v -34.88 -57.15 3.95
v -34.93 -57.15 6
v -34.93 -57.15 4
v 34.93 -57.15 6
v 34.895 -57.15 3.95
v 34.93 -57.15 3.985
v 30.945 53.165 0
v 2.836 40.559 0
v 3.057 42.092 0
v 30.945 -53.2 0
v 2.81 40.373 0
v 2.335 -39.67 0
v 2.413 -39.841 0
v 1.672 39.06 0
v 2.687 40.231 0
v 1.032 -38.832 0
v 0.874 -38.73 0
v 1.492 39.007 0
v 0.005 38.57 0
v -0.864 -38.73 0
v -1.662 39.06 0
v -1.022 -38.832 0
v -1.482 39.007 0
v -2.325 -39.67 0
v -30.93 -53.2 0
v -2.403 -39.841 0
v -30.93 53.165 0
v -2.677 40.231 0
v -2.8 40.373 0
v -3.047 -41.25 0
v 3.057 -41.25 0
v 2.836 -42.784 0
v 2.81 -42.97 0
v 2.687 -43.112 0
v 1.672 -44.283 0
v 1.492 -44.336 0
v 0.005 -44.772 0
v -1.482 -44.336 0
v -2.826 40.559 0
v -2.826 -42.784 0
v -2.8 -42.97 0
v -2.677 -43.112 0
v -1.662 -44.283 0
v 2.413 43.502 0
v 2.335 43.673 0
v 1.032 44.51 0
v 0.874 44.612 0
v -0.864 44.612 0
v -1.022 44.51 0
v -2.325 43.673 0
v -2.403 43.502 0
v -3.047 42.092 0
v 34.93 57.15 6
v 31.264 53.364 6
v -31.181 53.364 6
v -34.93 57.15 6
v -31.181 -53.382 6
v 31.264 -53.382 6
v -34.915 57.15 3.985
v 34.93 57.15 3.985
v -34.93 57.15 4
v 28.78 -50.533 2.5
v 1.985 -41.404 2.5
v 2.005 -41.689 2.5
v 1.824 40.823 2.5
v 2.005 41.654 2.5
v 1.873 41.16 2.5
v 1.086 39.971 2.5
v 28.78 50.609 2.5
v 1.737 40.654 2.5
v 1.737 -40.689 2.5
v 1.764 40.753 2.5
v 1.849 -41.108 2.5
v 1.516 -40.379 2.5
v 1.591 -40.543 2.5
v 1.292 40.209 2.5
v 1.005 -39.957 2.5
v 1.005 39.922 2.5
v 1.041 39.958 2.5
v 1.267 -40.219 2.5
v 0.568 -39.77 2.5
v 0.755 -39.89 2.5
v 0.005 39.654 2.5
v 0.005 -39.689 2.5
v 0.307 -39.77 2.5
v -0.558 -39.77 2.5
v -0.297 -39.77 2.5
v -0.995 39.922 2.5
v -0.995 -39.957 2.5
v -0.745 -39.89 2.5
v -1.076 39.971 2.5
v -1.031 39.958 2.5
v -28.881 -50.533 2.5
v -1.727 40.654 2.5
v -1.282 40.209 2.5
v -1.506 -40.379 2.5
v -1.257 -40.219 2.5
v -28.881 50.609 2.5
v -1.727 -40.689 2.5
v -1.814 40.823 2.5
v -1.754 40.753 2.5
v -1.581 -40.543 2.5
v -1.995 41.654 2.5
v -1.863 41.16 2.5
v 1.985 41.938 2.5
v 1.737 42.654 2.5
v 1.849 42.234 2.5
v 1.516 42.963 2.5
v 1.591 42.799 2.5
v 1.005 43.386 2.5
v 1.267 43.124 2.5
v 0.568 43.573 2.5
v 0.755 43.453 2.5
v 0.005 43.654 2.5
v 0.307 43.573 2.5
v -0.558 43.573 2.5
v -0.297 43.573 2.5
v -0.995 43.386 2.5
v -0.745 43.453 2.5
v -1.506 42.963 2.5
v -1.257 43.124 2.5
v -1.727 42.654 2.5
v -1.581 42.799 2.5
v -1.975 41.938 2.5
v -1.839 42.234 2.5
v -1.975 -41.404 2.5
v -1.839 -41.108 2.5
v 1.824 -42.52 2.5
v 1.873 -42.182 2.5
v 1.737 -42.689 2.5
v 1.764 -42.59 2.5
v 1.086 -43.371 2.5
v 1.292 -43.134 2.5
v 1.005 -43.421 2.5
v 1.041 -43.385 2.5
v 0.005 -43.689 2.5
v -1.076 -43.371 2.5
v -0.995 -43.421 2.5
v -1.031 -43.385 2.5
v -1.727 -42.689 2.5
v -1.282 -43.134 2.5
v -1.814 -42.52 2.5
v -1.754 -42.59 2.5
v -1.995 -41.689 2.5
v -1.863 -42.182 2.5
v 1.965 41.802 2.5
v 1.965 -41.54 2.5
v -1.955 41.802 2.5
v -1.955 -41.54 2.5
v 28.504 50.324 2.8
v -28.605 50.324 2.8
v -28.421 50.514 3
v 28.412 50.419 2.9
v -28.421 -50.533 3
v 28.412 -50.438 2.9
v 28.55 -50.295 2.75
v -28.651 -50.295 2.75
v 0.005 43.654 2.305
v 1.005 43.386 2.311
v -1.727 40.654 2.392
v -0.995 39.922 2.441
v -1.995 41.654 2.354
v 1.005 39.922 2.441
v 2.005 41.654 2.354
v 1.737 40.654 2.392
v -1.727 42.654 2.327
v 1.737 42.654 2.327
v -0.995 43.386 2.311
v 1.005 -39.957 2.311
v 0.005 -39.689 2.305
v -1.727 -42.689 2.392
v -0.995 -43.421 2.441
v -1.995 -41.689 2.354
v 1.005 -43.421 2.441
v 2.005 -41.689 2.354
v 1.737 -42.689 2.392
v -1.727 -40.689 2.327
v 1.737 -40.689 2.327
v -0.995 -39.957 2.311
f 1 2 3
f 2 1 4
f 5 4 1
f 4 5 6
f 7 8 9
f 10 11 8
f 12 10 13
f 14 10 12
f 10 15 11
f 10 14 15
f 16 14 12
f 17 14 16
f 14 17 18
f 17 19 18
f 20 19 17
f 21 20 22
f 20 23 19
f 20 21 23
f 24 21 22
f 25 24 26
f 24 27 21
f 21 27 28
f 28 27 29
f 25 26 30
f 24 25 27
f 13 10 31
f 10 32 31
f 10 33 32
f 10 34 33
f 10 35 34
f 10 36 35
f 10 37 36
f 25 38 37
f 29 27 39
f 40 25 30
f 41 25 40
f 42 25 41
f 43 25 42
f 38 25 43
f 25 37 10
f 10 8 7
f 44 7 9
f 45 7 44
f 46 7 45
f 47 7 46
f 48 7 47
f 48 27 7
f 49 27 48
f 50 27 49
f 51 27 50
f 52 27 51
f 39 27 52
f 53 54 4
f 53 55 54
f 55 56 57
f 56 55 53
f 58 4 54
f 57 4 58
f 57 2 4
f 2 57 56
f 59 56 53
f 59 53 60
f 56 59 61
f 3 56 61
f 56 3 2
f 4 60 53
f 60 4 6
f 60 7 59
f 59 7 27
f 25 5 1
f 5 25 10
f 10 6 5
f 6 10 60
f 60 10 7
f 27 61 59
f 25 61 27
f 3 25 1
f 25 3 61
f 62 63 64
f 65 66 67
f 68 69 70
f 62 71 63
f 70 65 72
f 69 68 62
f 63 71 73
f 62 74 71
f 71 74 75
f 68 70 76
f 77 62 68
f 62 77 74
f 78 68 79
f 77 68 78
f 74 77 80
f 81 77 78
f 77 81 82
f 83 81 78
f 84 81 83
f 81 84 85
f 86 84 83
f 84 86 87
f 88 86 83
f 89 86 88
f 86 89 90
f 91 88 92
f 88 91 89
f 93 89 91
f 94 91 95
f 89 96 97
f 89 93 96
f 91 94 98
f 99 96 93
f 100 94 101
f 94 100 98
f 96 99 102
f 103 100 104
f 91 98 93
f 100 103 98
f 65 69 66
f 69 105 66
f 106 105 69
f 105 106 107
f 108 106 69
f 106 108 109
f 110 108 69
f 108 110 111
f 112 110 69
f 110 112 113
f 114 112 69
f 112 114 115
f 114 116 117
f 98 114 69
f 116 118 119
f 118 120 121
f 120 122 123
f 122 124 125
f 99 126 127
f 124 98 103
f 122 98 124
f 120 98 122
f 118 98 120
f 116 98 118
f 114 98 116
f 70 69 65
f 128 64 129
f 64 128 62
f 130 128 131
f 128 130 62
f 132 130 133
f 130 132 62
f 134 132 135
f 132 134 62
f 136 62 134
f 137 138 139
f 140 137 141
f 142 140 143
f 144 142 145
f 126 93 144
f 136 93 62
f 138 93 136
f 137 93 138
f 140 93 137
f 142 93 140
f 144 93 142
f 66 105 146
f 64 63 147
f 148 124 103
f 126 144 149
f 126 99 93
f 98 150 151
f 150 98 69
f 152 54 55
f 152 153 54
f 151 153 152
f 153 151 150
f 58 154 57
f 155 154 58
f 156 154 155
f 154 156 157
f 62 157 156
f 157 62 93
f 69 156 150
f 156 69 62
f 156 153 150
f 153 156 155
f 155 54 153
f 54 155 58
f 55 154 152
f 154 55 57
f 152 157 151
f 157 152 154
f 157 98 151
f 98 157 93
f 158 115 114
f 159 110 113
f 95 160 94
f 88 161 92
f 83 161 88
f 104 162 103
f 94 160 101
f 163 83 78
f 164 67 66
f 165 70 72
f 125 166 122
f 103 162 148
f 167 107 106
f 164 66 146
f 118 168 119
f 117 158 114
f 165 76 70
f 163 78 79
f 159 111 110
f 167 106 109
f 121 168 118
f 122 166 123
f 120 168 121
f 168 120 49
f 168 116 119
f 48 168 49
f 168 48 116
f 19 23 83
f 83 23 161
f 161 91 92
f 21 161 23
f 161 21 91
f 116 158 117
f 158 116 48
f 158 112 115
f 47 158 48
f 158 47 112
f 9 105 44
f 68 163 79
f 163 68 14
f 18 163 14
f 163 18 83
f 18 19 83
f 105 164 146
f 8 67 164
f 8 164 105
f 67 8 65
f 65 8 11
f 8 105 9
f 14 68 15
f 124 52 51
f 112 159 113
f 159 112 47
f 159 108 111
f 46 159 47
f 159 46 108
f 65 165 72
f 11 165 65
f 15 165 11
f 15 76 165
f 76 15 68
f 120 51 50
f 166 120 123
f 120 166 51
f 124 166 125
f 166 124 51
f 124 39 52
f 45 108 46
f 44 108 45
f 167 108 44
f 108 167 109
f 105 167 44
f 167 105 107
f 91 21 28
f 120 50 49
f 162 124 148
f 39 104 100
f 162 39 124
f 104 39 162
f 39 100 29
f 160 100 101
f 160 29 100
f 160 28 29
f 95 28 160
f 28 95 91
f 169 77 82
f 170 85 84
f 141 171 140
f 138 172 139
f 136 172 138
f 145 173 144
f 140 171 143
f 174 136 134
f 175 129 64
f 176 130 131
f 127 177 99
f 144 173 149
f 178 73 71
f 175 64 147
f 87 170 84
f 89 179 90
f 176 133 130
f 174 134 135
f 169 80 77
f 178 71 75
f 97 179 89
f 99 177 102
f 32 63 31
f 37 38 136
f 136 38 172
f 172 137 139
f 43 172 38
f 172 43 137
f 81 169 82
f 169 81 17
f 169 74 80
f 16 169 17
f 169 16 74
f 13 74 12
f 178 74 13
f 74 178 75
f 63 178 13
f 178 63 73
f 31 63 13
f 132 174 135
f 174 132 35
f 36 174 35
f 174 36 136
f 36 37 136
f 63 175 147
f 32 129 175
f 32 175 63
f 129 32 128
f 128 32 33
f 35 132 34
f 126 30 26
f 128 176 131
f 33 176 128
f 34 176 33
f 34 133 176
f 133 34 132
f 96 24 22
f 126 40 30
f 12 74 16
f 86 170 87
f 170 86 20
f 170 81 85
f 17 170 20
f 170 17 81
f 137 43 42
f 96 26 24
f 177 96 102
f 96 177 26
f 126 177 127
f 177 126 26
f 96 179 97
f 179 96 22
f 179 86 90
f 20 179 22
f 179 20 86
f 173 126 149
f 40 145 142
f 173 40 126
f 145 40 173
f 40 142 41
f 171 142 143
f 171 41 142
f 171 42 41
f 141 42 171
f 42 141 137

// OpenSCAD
// WALLY - Wall Plate Customizer v1.1
// by TheNewHobbyist 2013 (http://thenewhobbyist.com)
// http://www.thingiverse.com/thing:
//
// Most of the connectors used with this thing are panel mount connectors from
// www.DataPro.net I can't vouch for their quality but they did have easy to
// find dimensions for their products so I used them.
//
// This could be tightened up considerably but I thought I'd get it out there for people
// to experiment with before I lose my mind staring at it too long. Also this is my
// first OpenSCAD model so cut me some slack ;)
//
//   Notes:
//
// * The plug types "Duplex Outlet", "Toggle Switch", and "Rocker" will all use the
//   entire plate when selected in top or bottom configuration. The other selection (if
//   not "none" will be selected.
//
// * "None" and "Blank should not be considered equal. if "None" is selected for one of
//   the two holes on a plate the other selection will be centered on that plate. If
//   "Blank" is selected that plug location will remain blank but the other selection
//   will NOT move into a centered position.
//
//	Change Log:
//
//	v1.1
//	UPDATED: Screw hole locations for designer and toggle plate types.
//	UPDATED: Hole size for designer plate type.
//	UPDATED: Outlet hole spacing
//

  //////////////////////////
 // Customizer Settings: //
//////////////////////////

//How big are we talkin' here?
plate_width = 1; //	[1:5]

//Pick a plug or full plate type
1st_plate = "none";  //	["none":None, "blank":Blank Port, "toggle":Full Plate - Toggle Switch, "outlet":Full Plate - Duplex Outlet, "rocker":Full Plate - Rocker/Designer Plate, "keystone1":Keystone Jack, "vga":VGA Port, "hdmi":HDMI Port, "dvi":DVI-I Port, "displayport":Displayport, "cat5e":Cat5e/Cat6 Port, "usb-a":USB-A Port, "usb-b":USB-B Port, "firewire":Firewire IEEE 1394 Port, "db09":DB-09 Port, "ps2":PS2 Port, "f-type": F-Type/Coaxial Port,"svideo":S-Video Port, "stereo":Stereo Headphone Jack]
//Pick a bottom plug type or leave as none
1st_plate_bottom_hole = "none";  //	["none":None, "blank":Blank Port, "keystone1":Keystone Jack, "vga":VGA Port, "hdmi":HDMI Port, "dvi":DVI-I Port, "displayport":Displayport, "cat5e":Cat5e/Cat6 Port, "usb-a":USB-A Port, "usb-b":USB-B Port, "firewire":Firewire IEEE 1394 Port, "db09":DB-09 Port, "ps2":PS2 Port, "f-type": F-Type/Coaxial Port,"svideo":S-Video Port, "stereo":Stereo Headphone Jack]
//Pick a plug or full plate type
2nd_plate = "none";  //	["none":None, "blank":Blank Port, "toggle":Full Plate - Toggle Switch, "outlet":Full Plate - Duplex Outlet, "rocker":Full Plate - Rocker/Designer Plate, "keystone1":Keystone Jack, "vga":VGA Port, "hdmi":HDMI Port, "dvi":DVI-I Port, "displayport":Displayport, "cat5e":Cat5e/Cat6 Port, "usb-a":USB-A Port, "usb-b":USB-B Port, "firewire":Firewire IEEE 1394 Port, "db09":DB-09 Port, "ps2":PS2 Port, "f-type": F-Type/Coaxial Port,"svideo":S-Video Port, "stereo":Stereo Headphone Jack]
//Pick a bottom plug type or leave as none
2nd_plate_bottom_hole = "none";  //	["none":None, "blank":Blank Port, "keystone1":Keystone Jack, "vga":VGA Port, "hdmi":HDMI Port, "dvi":DVI-I Port, "displayport":Displayport, "cat5e":Cat5e/Cat6 Port, "usb-a":USB-A Port, "usb-b":USB-B Port, "firewire":Firewire IEEE 1394 Port, "db09":DB-09 Port, "ps2":PS2 Port, "f-type": F-Type/Coaxial Port,"svideo":S-Video Port, "stereo":Stereo Headphone Jack]
//Pick a plug or full plate type
3rd_plate = "none";  //	["none":None, "blank":Blank Port, "toggle":Full Plate - Toggle Switch, "outlet":Full Plate - Duplex Outlet, "rocker":Full Plate - Rocker/Designer Plate, "keystone1":Keystone Jack, "vga":VGA Port, "hdmi":HDMI Port, "dvi":DVI-I Port, "displayport":Displayport, "cat5e":Cat5e/Cat6 Port, "usb-a":USB-A Port, "usb-b":USB-B Port, "firewire":Firewire IEEE 1394 Port, "db09":DB-09 Port, "ps2":PS2 Port, "f-type": F-Type/Coaxial Port,"svideo":S-Video Port, "stereo":Stereo Headphone Jack]
//Pick a bottom plug type or leave as none
3rd_plate_bottom_hole = "none";  //	["none":None, "blank":Blank Port, "keystone1":Keystone Jack, "vga":VGA Port, "hdmi":HDMI Port, "dvi":DVI-I Port, "displayport":Displayport, "cat5e":Cat5e/Cat6 Port, "usb-a":USB-A Port, "usb-b":USB-B Port, "firewire":Firewire IEEE 1394 Port, "db09":DB-09 Port, "ps2":PS2 Port, "f-type": F-Type/Coaxial Port,"svideo":S-Video Port, "stereo":Stereo Headphone Jack]
//Pick a plug or full plate type
4th_plate = "none";  //	["none":None, "blank":Blank Port, "toggle":Full Plate - Toggle Switch, "outlet":Full Plate - Duplex Outlet, "rocker":Full Plate - Rocker/Designer Plate, "keystone1":Keystone Jack, "vga":VGA Port, "hdmi":HDMI Port, "dvi":DVI-I Port, "displayport":Displayport, "cat5e":Cat5e/Cat6 Port, "usb-a":USB-A Port, "usb-b":USB-B Port, "firewire":Firewire IEEE 1394 Port, "db09":DB-09 Port, "ps2":PS2 Port, "f-type": F-Type/Coaxial Port,"svideo":S-Video Port, "stereo":Stereo Headphone Jack]
//Pick a bottom plug type or leave as none
4th_plate_bottom_hole = "none";  //	["none":None, "blank":Blank Port, "keystone1":Keystone Jack, "vga":VGA Port, "hdmi":HDMI Port, "dvi":DVI-I Port, "displayport":Displayport, "cat5e":Cat5e/Cat6 Port, "usb-a":USB-A Port, "usb-b":USB-B Port, "firewire":Firewire IEEE 1394 Port, "db09":DB-09 Port, "ps2":PS2 Port, "f-type": F-Type/Coaxial Port,"svideo":S-Video Port, "stereo":Stereo Headphone Jack]
//Pick a plug or full plate type
5th_plate = "none";  //	["none":None, "blank":Blank Port, "toggle":Full Plate - Toggle Switch, "outlet":Full Plate - Duplex Outlet, "rocker":Full Plate - Rocker/Designer Plate, "keystone1":Keystone Jack, "vga":VGA Port, "hdmi":HDMI Port, "dvi":DVI-I Port, "displayport":Displayport, "cat5e":Cat5e/Cat6 Port, "usb-a":USB-A Port, "usb-b":USB-B Port, "firewire":Firewire IEEE 1394 Port, "db09":DB-09 Port, "ps2":PS2 Port, "f-type": F-Type/Coaxial Port,"svideo":S-Video Port, "stereo":Stereo Headphone Jack]
//Pick a bottom plug type or leave as none
5th_plate_bottom_hole = "none";  //	["none":None, "blank":Blank Port, "keystone1":Keystone Jack, "vga":VGA Port, "hdmi":HDMI Port, "dvi":DVI-I Port, "displayport":Displayport, "cat5e":Cat5e/Cat6 Port, "usb-a":USB-A Port, "usb-b":USB-B Port, "firewire":Firewire IEEE 1394 Port, "db09":DB-09 Port, "ps2":PS2 Port, "f-type": F-Type/Coaxial Port,"svideo":S-Video Port, "stereo":Stereo Headphone Jack]

  //////////////////////
 // Static Settings: //
//////////////////////

module GoAwayCustomizer() {
// This module is here to stop Customizer from picking up the variables below
}

height = 114.3; //plate height (static)
gang_width=[0,69.86,115.824,161.925,206.375,254]; // Plate widths (standard)

edgewidth = gang_width[plate_width] + 10; // Bevel setting for top and bottom
rightbevel = gang_width[plate_width] - 4; // Bevel for right side (scales)

left_offset = 34.925; // Offset first hole position
switch_offset = 46.0375; // Offset all additional holes
thinner_offset=[0,0.92,0.95,0.96,0.97,0.973]; // Manual fix for right side wackiness

positions=[height/2,42.9,71.4];
positiona = 42.9; // dual plate upper
positionb = 71.4; // dual plate lower

// preview[view:north, tilt:bottom]

  ///////////////////
 // Hole Control: //
///////////////////

module plate1(){
	if (1st_plate == "toggle" || 1st_plate_bottom_hole == "toggle"){
		translate([0,left_offset,0]) toggle_screws();
		translate([0,left_offset,0]) hole("toggle");
		}
	else if (1st_plate == "rocker" || 1st_plate_bottom_hole == "rocker"){
		translate([0,left_offset,0]) rocker_screws();
		translate([0,left_offset,0]) hole("rocker");
		}
	else if (1st_plate == "outlet" || 1st_plate_bottom_hole == "outlet") {
	translate([0,left_offset,0]) hole("outlet");
	}
	else if (1st_plate_bottom_hole == "none") {
		translate([0,left_offset,0]) box_screws();
		translate([positions[0],left_offset,0]) hole(1st_plate);
			}
	else if (1st_plate == "none") {
		translate([0,left_offset,0]) box_screws();
		translate([positions[0],left_offset,0]) hole(1st_plate_bottom_hole);
			}
	else {
	translate([0,left_offset,0]) box_screws();
	translate([positions[1],left_offset,0]) hole(1st_plate);
	translate([positions[2],left_offset,0]) hole(1st_plate_bottom_hole);
	}
}

module plate2(){
	if (2nd_plate == "toggle" || 2nd_plate_bottom_hole == "toggle"){
		translate([0,left_offset + switch_offset,0]) toggle_screws();
		translate([0,left_offset + switch_offset,0]) hole("toggle");
		}
	else if (2nd_plate == "rocker" || 2nd_plate_bottom_hole == "rocker"){
		translate([0,left_offset + switch_offset,0]) rocker_screws();
		translate([0,left_offset + switch_offset,0]) hole("rocker");
		}
	else if (2nd_plate == "outlet" || 2nd_plate_bottom_hole == "outlet") {
	translate([0,left_offset + switch_offset,0]) hole("outlet");
	}
	else if (2nd_plate_bottom_hole == "none") {
		translate([0,left_offset + switch_offset,0]) box_screws();
		translate([positions[0],left_offset + switch_offset,0]) hole(2nd_plate);
			}
	else if (2nd_plate == "none") {
		translate([0,left_offset + switch_offset,0]) box_screws();
		translate([positions[0],left_offset + switch_offset,0]) hole(2nd_plate_bottom_hole);
			}
	else {
	translate([0,left_offset + switch_offset,0]) box_screws();
	translate([positions[1],left_offset + switch_offset,0]) hole(2nd_plate);
	translate([positions[2],left_offset + switch_offset,0]) hole(2nd_plate_bottom_hole);
	}
}

module plate3(){
	if (3rd_plate == "toggle" || 3rd_plate_bottom_hole == "toggle"){
		translate([0,left_offset + switch_offset * 2,0]) toggle_screws();
		translate([0,left_offset + switch_offset * 2,0]) hole("toggle");
		}
	else if (3rd_plate == "rocker" || 3rd_plate_bottom_hole == "rocker"){
		translate([0,left_offset + switch_offset * 2,0]) rocker_screws();
		translate([0,left_offset + switch_offset * 2,0]) hole("rocker");
		}
	else if (3rd_plate == "outlet" || 3rd_plate_bottom_hole == "outlet") {
	translate([0,left_offset + switch_offset * 2,0]) hole("outlet");
	}
	else if (3rd_plate_bottom_hole == "none") {
		translate([0,left_offset + switch_offset * 2,0]) box_screws();
		translate([positions[0],left_offset + switch_offset * 2,0]) hole(3rd_plate);
			}
	else if (3rd_plate == "none") {
		translate([0,left_offset + switch_offset * 2,0]) box_screws();
		translate([positions[0],left_offset + switch_offset * 2,0]) hole(3rd_plate_bottom_hole);
			}
	else {
	translate([0,left_offset + switch_offset * 2,0]) box_screws();
	translate([positions[1],left_offset + switch_offset * 2,0]) hole(3rd_plate);
	translate([positions[2],left_offset + switch_offset * 2,0]) hole(3rd_plate_bottom_hole);
	}
}

module plate4(){
	if (4th_plate == "toggle" || 4th_plate_bottom_hole == "toggle"){
		translate([0,left_offset + switch_offset * 3,0]) toggle_screws();
		translate([0,left_offset + switch_offset * 3,0]) hole("toggle");
		}
	else if (4th_plate == "rocker" || 4th_plate_bottom_hole == "rocker"){
		translate([0,left_offset + switch_offset * 3,0]) rocker_screws();
		translate([0,left_offset + switch_offset * 3,0]) hole("rocker");
		}
	else if (4th_plate == "outlet" || 4th_plate_bottom_hole == "outlet") {
	translate([0,left_offset + switch_offset * 3,0]) hole("outlet");
	}
	else if (4th_plate_bottom_hole == "none") {
		translate([0,left_offset + switch_offset * 3,0]) box_screws();
		translate([positions[0],left_offset + switch_offset * 3,0]) hole(4th_plate);
			}
	else if (4th_plate == "none") {
		translate([0,left_offset + switch_offset * 3,0]) box_screws();
		translate([positions[0],left_offset + switch_offset * 3,0]) hole(4th_plate_bottom_hole);
			}
	else {
	translate([0,left_offset + switch_offset * 3,0]) box_screws();
	translate([positions[1],left_offset + switch_offset * 3,0]) hole(4th_plate);
	translate([positions[2],left_offset + switch_offset * 3,0]) hole(4th_plate_bottom_hole);
	}
}

module plate5(){
	if (5th_plate == "toggle" || 5th_plate_bottom_hole == "toggle"){
		translate([0,left_offset + switch_offset * 4,0]) toggle_screws();
		translate([0,left_offset + switch_offset * 4,0]) hole("toggle");
		}
	else if (5th_plate == "rocker" || 5th_plate_bottom_hole == "rocker"){
		translate([0,left_offset + switch_offset * 4,0]) rocker_screws();
		translate([0,left_offset + switch_offset * 4,0]) hole("rocker");
		}
	else if (5th_plate == "outlet" || 5th_plate_bottom_hole == "outlet") {
	translate([0,left_offset + switch_offset * 4,0]) hole("outlet");
	}
	else if (5th_plate_bottom_hole == "none") {
		translate([0,left_offset + switch_offset * 4,0]) box_screws();
		translate([positions[0],left_offset + switch_offset * 4,0]) hole(5th_plate);
			}
	else if (5th_plate == "none") {
		translate([0,left_offset + switch_offset * 4,0]) box_screws();
		translate([positions[0],left_offset + switch_offset * 4,0]) hole(5th_plate_bottom_hole);
			}
	else {
	translate([0,left_offset + switch_offset * 4,0]) box_screws();
	translate([positions[1],left_offset + switch_offset * 4,0]) hole(5th_plate);
	translate([positions[2],left_offset + switch_offset * 4,0]) hole(5th_plate_bottom_hole);
	}
}

  /////////////////
 // SolidWorks: //
/////////////////

module plate1_solid(){
if (1st_plate == "keystone1" && 1st_plate_bottom_hole == "none") {
	translate([71.4,23.4,-3.9]) hole("keystone_solid");
	}
else if (1st_plate == "keystone1" && 1st_plate_bottom_hole != "outlet" && 1st_plate_bottom_hole != "toggle" && 1st_plate_bottom_hole != "rocker") {
	translate([57.2,23.4,-3.9]) hole("keystone_solid");
	}
if (1st_plate_bottom_hole == "keystone1" && 1st_plate == "none") {
	translate([71.4,23.4,-3.9]) hole("keystone_solid");
	}
else if (1st_plate_bottom_hole == "keystone1" && 1st_plate != "outlet" && 1st_plate != "toggle" && 1st_plate != "rocker") {
	translate([85.6,23.4,-3.9]) hole("keystone_solid");
	}

}

module plate2_solid(){
if (2nd_plate == "keystone1" && 2nd_plate_bottom_hole == "none") {
	translate([71.4,23.4 + switch_offset,-3.9]) hole("keystone_solid");
	}
else if (2nd_plate == "keystone1" && 2nd_plate_bottom_hole != "outlet" && 2nd_plate_bottom_hole != "toggle" && 2nd_plate_bottom_hole != "rocker") {
	translate([57.2,23.4 + switch_offset,-3.9]) hole("keystone_solid");
	}
if (2nd_plate_bottom_hole == "keystone1" && 2nd_plate == "none") {
	translate([71.4,23.4 + switch_offset,-3.9]) hole("keystone_solid");
	}
else if (2nd_plate_bottom_hole == "keystone1" && 2nd_plate != "outlet" && 2nd_plate != "toggle" && 2nd_plate != "rocker") {
	translate([85.6,23.4 + switch_offset,-3.9]) hole("keystone_solid");
	}

}

module plate3_solid(){
if (3rd_plate == "keystone1" && 3rd_plate_bottom_hole == "none") {
	translate([71.4,23.4 + switch_offset * 2,-3.9]) hole("keystone_solid");
	}
else if (3rd_plate == "keystone1" && 3rd_plate_bottom_hole != "outlet" && 3rd_plate_bottom_hole != "toggle" && 3rd_plate_bottom_hole != "rocker") {
	translate([57.2,23.4 + switch_offset * 2,-3.9]) hole("keystone_solid");
	}
if (3rd_plate_bottom_hole == "keystone1" && 3rd_plate == "none") {
	translate([71.4,23.4 + switch_offset * 2,-3.9]) hole("keystone_solid");
	}
else if (3rd_plate_bottom_hole == "keystone1" && 3rd_plate != "outlet" && 3rd_plate != "toggle" && 3rd_plate != "rocker") {
	translate([85.6,23.4 + switch_offset * 2,-3.9]) hole("keystone_solid");
	}

}

module plate4_solid(){
if (4th_plate == "keystone1" && 4th_plate_bottom_hole == "none") {
	translate([71.4,23.4 + switch_offset * 3,-3.9]) hole("keystone_solid");
	}
else if (4th_plate == "keystone1" && 4th_plate_bottom_hole != "outlet" && 4th_plate_bottom_hole != "toggle" && 4th_plate_bottom_hole != "rocker") {
	translate([57.2,23.4 + switch_offset * 3,-3.9]) hole("keystone_solid");
	}
if (4th_plate_bottom_hole == "keystone1" && 4th_plate == "none") {
	translate([71.4,23.4 + switch_offset * 3,-3.9]) hole("keystone_solid");
	}
else if (4th_plate_bottom_hole == "keystone1" && 4th_plate != "outlet" && 4th_plate != "toggle" && 4th_plate != "rocker") {
	translate([85.6,23.4 + switch_offset * 3,-3.9]) hole("keystone_solid");
	}

}

module plate5_solid(){
if (5th_plate == "keystone1" && 5th_plate_bottom_hole == "none") {
	translate([71.4,23.4 + switch_offset * 4,-3.9]) hole("keystone_solid");
	}
else if (5th_plate == "keystone1" && 5th_plate_bottom_hole != "outlet" && 5th_plate_bottom_hole != "toggle" && 5th_plate_bottom_hole != "rocker") {
	translate([57.2,23.4 + switch_offset * 4,-3.9]) hole("keystone_solid");
	}
if (5th_plate_bottom_hole == "keystone1" && 5th_plate == "none") {
	translate([71.4,23.4 + switch_offset * 4,-3.9]) hole("keystone_solid");
	}
else if (5th_plate_bottom_hole == "keystone1" && 5th_plate != "outlet" && 5th_plate != "toggle" && 5th_plate != "rocker") {
	translate([85.6,23.4 + switch_offset * 4,-3.9]) hole("keystone_solid");
	}

}

  ///////////////////
 // PlateStation: //
///////////////////

//Plate size and bevel
module plate() {
	difference() {
		cube([height,gang_width[plate_width],6]);
		translate([-4.3,-5,6.2]) rotate([0,45,0]) cube([6,edgewidth,6]); //Top Bevel
		translate([110.1,-5,6.25]) rotate([0,45,0]) cube([6,edgewidth,6]); //Bottom Bevel
		translate([120,-4.4,6.1]) rotate([0,45,90]) cube([6,124,6]); //Left Bevel (doesn't change)
		translate([120,rightbevel,6]) rotate([0,45,90]) cube([6,124,6]); //Right Bevel (scales right)
				}
			}

// Thinning Plate
module plate_inner() {
	scale([0.95,thinner_offset[plate_width],1]){
	translate([3,3,0]){
	difference() {
		cube([114.3,gang_width[plate_width],6.5]);
		translate([-4.3,-5,6.2]) rotate([0,45,0]) cube([6,edgewidth,6]); //Top Bevel
		translate([110.1,-5,6.25]) rotate([0,45,0]) cube([6,edgewidth,6]); //Bottom Bevel
		translate([120,-4.4,6.1]) rotate([0,45,90]) cube([6,124,6]); //Left Bevel (doesn't change)
		translate([120,rightbevel,6]) rotate([0,45,90]) cube([6,124,6]); //Right Bevel (scales right)
				}
			}
		}
	}

// Box screw holes
module box_screws(){
	 translate([15.4964,0,-1]) cylinder(r=2, h=10, $fn=12);
	 translate([15.4964,0,3.5]) cylinder(r1=2, r2=3.3, h=3);
	 translate([98.8389,0,-1]) cylinder(r=2, h=10, $fn=12);
	 translate([98.8389,0,3.5]) cylinder(r1=2, r2=3.3, h=3);
}

// Rocker/Designer screw holes
module rocker_screws(){
	 translate([8.7964,0,-1]) cylinder(r=2, h=10, $fn=12);
	 translate([8.7964,0,3.5]) cylinder(r1=2, r2=3.3, h=3);
	 translate([105.5389,0,-1]) cylinder(r=2, h=10, $fn=12);
	 translate([105.5389,0,3.5]) cylinder(r1=2, r2=3.3, h=3);
}

// Toggle screw holes
module toggle_screws(){
	 translate([26.987,0,-1]) cylinder(r=2, h=10, $fn=12);
	 translate([26.987,0,3.5]) cylinder(r1=2, r2=3.3, h=3);
	 translate([87.313,0,-1]) cylinder(r=2, h=10, $fn=12);
	 translate([87.313,0,3.5]) cylinder(r1=2, r2=3.3, h=3);
}

  ///////////////
 // Portland: //
///////////////

// Hole Cutout definitions
module hole(hole_type) {


// Toggle switch hole and screw holes
	if (hole_type == "toggle") {
		translate([57.15,0,0]) cube([23.8125,10.3188,15], center = true);
		 						}

// Rocker switch plate
	if (hole_type == "rocker") {
		translate([57.15,0,0]) cube([67.1,33.3,15], center = true);

		 						}

// Duplex power outlet plate or dual side toggles
	if (hole_type == "outlet" || hole_type == "dualsidetoggle") {
		translate([37.820,0,0]) {
			difference() {
				cylinder(r=17.4625, h=15, center = true);
				translate([-24.2875,-15,-2]) cube([10,37,15], center = false);
				translate([14.2875,-15,-2]) cube([10,37,15], center = false);
								}
							}
		translate([76.603,0,0]){
			difference(){
				cylinder(r=17.4625, h=15, center = true);
				translate([-24.2875,-15,-2]) cube([10,37,15], center = false);
				translate([14.2875,-15,-2]) cube([10,37,15], center = false);
								}
							}
		translate([57.15,0,-1]) cylinder(r=2, h=10);
		translate([57.15,0,3.5]) cylinder(r1=2, r2=3.3, h=3);
							}

// Blank plate
	if (hole_type == "blank") { }

// VGA & DB09 plate
// VGA Fits http://www.datapro.net/products/vga-dual-panel-mount-f-f-cable.html
// DB09 Fits http://www.datapro.net/products/db9-serial-panel-mount-male-extension.html
	if (hole_type == "vga" || hole_type == "db09") {
			translate([0,-12.5,3]) cylinder(r=1.75, h=10, center = true);
			translate([0,12.5,3]) cylinder(r=1.75, h=10, center = true);
				difference(){
					cube([10,19,13], center=true);
					translate([-5,-9.2,1]) rotate([0,0,-35.6]) cube([4.4,2.4,15], center=true);
					translate([.9,-11.2,0]) rotate([0,0,9.6]) cube([10,4.8,15], center=true);
					translate([4.6,-8.5,0]) rotate([0,0,37.2]) cube([4.4,2.4,15], center=true);
					translate([-5,9.2,1]) rotate([0,0,35.6]) cube([4.4,2.4,15], center=true);
					translate([0.9,11.2,0]) rotate([0,0,-9.6]) cube([10,4.8,15], center=true);
					translate([4.6,8.5,0]) rotate([0,0,-37.2]) cube([4.4,2.4,15], center=true);
								}
						}

// HDMI plate
// Fits http://www.datapro.net/products/hdmi-panel-mount-extension-cable.html
	if (hole_type == "hdmi") {
		translate([0,-13,3]) cylinder(r=1.75, h=10, center = true);
		translate([0,13,3]) cylinder(r=1.75, h=10, center = true);
		translate([0,0,3]) cube([6,16,10], center=true);
							}

// DVI-I plate
// Fits http://www.datapro.net/products/dvi-i-panel-mount-extension-cable.html
	if (hole_type == "dvi") {
		translate([0,-16,3]) cylinder(r=1.75, h=10, center = true);
		translate([0,16,3]) cylinder(r=1.75, h=10, center = true);
		translate([0,0,3]) cube([10,26,10], center=true);
							}

// DisplayPort plate
// Fits http://www.datapro.net/products/dvi-i-panel-mount-extension-cable.html
	if (hole_type == "displayport") {
		translate([0,-13.5,3]) cylinder(r=1.75, h=10, center = true);
		translate([0,13.5,3]) cylinder(r=1.75, h=10, center = true);
		translate([0,0,0]){
			difference(){
				translate([0,0,3]) cube([7,19,10], center=true);
				translate([2.47,-9.37,3]) rotate([0,0,-54.6]) cube([3,5,14], center=true);
						}
								}
									}

// USB-A Plate
// Fits http://www.datapro.net/products/usb-panel-mount-type-a-cable.html
	if (hole_type == "usb-a") {
		translate([0,-15,3]) cylinder(r=1.75, h=10, center = true);
		translate([0,15,3]) cylinder(r=1.75, h=10, center = true);
		translate([0,0,3]) cube([8,16,10], center=true);
							}

// USB-B Plate
// Fits http://www.datapro.net/products/usb-panel-mount-type-b-cable.html
	if (hole_type == "usb-b") {
		translate([0,-13,3]) cylinder(r=1.75, h=10, center = true);
		translate([0,13,3]) cylinder(r=1.75, h=10, center = true);
		translate([0,0,3]) cube([11,12,10], center=true);
							}

// 1394 Firewire Plate
// Fits http://www.datapro.net/products/firewire-panel-mount-extension.html
	if (hole_type == "firewire") {
		translate([0,-13.5,3]) cylinder(r=1.75, h=10, center = true);
		translate([0,13.5,3]) cylinder(r=1.75, h=10, center = true);
		translate([0,0,3]) cube([7,12,10], center=true);
							}

// F-Type / Cable TV Plate
// Fits http://www.datapro.net/products/f-type-panel-mounting-coupler.html
	if (hole_type == "f-type") {
		translate([0,0,3]) cylinder(r=5.555, h=10, center=true);
							}

// Cat5e & Gat6 plate
// Cat5e Fits http://www.datapro.net/products/cat-5e-panel-mount-ethernet.html
// Cat6 Fits hhttp://www.datapro.net/products/cat-6-panel-mount-ethernet.html
	if (hole_type == "cat5e" || hole_type == "cat6") {
		translate([0,-12.5,3]) cylinder(r=1.75, h=10, center = true);
		translate([0,12.5,3]) cylinder(r=1.75, h=10, center = true);
		translate([0,0,3]) cube([15,15,10], center=true);
		}

// S-Video & PS2 plate
// S-Video Fits hhttp://www.datapro.net/products/cat-6-panel-mount-ethernet.html
// PS2 http://www.datapro.net/products/ps2-panel-mount-extension-cable.html
	if (hole_type == "svideo" || hole_type == "ps2") {
		translate([0,-10,3]) cylinder(r=1.75, h=10, center = true);
		translate([0,10,3]) cylinder(r=1.75, h=10, center = true);
		translate([0,0,3]) cylinder(r=5, h=10, center=true);
		}


// Stereo / 1/4" headphone jack coupler
// Stereo coupler Fits http://www.datapro.net/products/stereo-panel-mount-coupler.html
	if (hole_type == "stereo") {
		translate([0,0,3]) cylinder(r=2.985, h=10, center=true);
		}

//Keystone1 hole
//Hole for 1 Keystone Jack
	if (hole_type == "keystone1") {
		translate([0,0,5]) cube([16.5,15,10], center = true);
	}

//Keystone Solid
	if (hole_type == "keystone_solid") {
		rotate([0,0,90]) {
			difference(){
				translate([0,0,.1]) cube([23,30.5,9.8]);
					translate([4,4,0]){
						difference(){
							cube([15,22.5,10]);
							translate([-1,-0.001,3.501]) cube([17,2,6.5]);
							translate([-1,2.5,-3.40970]) rotate([45,0,0]) cube([17,2,6.5]);
							translate([-1,18.501,6.001]) cube([17,4,4]);
							translate([-1,20.5,0]) rotate([-45,0,0]) cube([17,2,6.5]);
						}
					}
				}
			}
		}

//End of module "hole"
}

  ////////////////////////
 // Number One ENGAGE: //
////////////////////////

// Rotate so it sits correctly on plate (whoops) and make upside down
rotate([0,180,90]){
// put plate at 0,0,0 for easier printing
translate([-57.15,-gang_width[plate_width]/2,-6]){

if (plate_width == 1) {
	difference() {
		plate();
		translate([0,0,-3]) plate_inner();
		plate1();
			}
		union() {
		plate1_solid();
		}
			}

else if (plate_width == 2) {
difference()
{
plate();
translate([0,0,-3]) plate_inner();
plate1();
plate2();
}
union() {
		plate1_solid();
		plate2_solid();
		}
}

else if (plate_width == 3) {
difference()
{
plate();
translate([0,0,-3]) plate_inner();
plate1();
plate2();
plate3();
}
union() {
		plate1_solid();
		plate2_solid();
		plate3_solid();
		}
}

else if (plate_width == 4) {
difference()
{
plate();
translate([0,0,-3]) plate_inner();
plate1();
plate2();
plate3();
plate4();
}
union() {
		plate1_solid();
		plate2_solid();
		plate3_solid();
		plate4_solid();
		}
}

else if (plate_width == 5) {
difference()
{
plate();
translate([0,0,-3]) plate_inner();
plate1();
plate2();
plate3();
plate4();
plate5();
}
union() {
		plate1_solid();
		plate2_solid();
		plate3_solid();
		plate4_solid();
		plate5_solid();
		}
}

//End Rotate
}
//End Translate
}
